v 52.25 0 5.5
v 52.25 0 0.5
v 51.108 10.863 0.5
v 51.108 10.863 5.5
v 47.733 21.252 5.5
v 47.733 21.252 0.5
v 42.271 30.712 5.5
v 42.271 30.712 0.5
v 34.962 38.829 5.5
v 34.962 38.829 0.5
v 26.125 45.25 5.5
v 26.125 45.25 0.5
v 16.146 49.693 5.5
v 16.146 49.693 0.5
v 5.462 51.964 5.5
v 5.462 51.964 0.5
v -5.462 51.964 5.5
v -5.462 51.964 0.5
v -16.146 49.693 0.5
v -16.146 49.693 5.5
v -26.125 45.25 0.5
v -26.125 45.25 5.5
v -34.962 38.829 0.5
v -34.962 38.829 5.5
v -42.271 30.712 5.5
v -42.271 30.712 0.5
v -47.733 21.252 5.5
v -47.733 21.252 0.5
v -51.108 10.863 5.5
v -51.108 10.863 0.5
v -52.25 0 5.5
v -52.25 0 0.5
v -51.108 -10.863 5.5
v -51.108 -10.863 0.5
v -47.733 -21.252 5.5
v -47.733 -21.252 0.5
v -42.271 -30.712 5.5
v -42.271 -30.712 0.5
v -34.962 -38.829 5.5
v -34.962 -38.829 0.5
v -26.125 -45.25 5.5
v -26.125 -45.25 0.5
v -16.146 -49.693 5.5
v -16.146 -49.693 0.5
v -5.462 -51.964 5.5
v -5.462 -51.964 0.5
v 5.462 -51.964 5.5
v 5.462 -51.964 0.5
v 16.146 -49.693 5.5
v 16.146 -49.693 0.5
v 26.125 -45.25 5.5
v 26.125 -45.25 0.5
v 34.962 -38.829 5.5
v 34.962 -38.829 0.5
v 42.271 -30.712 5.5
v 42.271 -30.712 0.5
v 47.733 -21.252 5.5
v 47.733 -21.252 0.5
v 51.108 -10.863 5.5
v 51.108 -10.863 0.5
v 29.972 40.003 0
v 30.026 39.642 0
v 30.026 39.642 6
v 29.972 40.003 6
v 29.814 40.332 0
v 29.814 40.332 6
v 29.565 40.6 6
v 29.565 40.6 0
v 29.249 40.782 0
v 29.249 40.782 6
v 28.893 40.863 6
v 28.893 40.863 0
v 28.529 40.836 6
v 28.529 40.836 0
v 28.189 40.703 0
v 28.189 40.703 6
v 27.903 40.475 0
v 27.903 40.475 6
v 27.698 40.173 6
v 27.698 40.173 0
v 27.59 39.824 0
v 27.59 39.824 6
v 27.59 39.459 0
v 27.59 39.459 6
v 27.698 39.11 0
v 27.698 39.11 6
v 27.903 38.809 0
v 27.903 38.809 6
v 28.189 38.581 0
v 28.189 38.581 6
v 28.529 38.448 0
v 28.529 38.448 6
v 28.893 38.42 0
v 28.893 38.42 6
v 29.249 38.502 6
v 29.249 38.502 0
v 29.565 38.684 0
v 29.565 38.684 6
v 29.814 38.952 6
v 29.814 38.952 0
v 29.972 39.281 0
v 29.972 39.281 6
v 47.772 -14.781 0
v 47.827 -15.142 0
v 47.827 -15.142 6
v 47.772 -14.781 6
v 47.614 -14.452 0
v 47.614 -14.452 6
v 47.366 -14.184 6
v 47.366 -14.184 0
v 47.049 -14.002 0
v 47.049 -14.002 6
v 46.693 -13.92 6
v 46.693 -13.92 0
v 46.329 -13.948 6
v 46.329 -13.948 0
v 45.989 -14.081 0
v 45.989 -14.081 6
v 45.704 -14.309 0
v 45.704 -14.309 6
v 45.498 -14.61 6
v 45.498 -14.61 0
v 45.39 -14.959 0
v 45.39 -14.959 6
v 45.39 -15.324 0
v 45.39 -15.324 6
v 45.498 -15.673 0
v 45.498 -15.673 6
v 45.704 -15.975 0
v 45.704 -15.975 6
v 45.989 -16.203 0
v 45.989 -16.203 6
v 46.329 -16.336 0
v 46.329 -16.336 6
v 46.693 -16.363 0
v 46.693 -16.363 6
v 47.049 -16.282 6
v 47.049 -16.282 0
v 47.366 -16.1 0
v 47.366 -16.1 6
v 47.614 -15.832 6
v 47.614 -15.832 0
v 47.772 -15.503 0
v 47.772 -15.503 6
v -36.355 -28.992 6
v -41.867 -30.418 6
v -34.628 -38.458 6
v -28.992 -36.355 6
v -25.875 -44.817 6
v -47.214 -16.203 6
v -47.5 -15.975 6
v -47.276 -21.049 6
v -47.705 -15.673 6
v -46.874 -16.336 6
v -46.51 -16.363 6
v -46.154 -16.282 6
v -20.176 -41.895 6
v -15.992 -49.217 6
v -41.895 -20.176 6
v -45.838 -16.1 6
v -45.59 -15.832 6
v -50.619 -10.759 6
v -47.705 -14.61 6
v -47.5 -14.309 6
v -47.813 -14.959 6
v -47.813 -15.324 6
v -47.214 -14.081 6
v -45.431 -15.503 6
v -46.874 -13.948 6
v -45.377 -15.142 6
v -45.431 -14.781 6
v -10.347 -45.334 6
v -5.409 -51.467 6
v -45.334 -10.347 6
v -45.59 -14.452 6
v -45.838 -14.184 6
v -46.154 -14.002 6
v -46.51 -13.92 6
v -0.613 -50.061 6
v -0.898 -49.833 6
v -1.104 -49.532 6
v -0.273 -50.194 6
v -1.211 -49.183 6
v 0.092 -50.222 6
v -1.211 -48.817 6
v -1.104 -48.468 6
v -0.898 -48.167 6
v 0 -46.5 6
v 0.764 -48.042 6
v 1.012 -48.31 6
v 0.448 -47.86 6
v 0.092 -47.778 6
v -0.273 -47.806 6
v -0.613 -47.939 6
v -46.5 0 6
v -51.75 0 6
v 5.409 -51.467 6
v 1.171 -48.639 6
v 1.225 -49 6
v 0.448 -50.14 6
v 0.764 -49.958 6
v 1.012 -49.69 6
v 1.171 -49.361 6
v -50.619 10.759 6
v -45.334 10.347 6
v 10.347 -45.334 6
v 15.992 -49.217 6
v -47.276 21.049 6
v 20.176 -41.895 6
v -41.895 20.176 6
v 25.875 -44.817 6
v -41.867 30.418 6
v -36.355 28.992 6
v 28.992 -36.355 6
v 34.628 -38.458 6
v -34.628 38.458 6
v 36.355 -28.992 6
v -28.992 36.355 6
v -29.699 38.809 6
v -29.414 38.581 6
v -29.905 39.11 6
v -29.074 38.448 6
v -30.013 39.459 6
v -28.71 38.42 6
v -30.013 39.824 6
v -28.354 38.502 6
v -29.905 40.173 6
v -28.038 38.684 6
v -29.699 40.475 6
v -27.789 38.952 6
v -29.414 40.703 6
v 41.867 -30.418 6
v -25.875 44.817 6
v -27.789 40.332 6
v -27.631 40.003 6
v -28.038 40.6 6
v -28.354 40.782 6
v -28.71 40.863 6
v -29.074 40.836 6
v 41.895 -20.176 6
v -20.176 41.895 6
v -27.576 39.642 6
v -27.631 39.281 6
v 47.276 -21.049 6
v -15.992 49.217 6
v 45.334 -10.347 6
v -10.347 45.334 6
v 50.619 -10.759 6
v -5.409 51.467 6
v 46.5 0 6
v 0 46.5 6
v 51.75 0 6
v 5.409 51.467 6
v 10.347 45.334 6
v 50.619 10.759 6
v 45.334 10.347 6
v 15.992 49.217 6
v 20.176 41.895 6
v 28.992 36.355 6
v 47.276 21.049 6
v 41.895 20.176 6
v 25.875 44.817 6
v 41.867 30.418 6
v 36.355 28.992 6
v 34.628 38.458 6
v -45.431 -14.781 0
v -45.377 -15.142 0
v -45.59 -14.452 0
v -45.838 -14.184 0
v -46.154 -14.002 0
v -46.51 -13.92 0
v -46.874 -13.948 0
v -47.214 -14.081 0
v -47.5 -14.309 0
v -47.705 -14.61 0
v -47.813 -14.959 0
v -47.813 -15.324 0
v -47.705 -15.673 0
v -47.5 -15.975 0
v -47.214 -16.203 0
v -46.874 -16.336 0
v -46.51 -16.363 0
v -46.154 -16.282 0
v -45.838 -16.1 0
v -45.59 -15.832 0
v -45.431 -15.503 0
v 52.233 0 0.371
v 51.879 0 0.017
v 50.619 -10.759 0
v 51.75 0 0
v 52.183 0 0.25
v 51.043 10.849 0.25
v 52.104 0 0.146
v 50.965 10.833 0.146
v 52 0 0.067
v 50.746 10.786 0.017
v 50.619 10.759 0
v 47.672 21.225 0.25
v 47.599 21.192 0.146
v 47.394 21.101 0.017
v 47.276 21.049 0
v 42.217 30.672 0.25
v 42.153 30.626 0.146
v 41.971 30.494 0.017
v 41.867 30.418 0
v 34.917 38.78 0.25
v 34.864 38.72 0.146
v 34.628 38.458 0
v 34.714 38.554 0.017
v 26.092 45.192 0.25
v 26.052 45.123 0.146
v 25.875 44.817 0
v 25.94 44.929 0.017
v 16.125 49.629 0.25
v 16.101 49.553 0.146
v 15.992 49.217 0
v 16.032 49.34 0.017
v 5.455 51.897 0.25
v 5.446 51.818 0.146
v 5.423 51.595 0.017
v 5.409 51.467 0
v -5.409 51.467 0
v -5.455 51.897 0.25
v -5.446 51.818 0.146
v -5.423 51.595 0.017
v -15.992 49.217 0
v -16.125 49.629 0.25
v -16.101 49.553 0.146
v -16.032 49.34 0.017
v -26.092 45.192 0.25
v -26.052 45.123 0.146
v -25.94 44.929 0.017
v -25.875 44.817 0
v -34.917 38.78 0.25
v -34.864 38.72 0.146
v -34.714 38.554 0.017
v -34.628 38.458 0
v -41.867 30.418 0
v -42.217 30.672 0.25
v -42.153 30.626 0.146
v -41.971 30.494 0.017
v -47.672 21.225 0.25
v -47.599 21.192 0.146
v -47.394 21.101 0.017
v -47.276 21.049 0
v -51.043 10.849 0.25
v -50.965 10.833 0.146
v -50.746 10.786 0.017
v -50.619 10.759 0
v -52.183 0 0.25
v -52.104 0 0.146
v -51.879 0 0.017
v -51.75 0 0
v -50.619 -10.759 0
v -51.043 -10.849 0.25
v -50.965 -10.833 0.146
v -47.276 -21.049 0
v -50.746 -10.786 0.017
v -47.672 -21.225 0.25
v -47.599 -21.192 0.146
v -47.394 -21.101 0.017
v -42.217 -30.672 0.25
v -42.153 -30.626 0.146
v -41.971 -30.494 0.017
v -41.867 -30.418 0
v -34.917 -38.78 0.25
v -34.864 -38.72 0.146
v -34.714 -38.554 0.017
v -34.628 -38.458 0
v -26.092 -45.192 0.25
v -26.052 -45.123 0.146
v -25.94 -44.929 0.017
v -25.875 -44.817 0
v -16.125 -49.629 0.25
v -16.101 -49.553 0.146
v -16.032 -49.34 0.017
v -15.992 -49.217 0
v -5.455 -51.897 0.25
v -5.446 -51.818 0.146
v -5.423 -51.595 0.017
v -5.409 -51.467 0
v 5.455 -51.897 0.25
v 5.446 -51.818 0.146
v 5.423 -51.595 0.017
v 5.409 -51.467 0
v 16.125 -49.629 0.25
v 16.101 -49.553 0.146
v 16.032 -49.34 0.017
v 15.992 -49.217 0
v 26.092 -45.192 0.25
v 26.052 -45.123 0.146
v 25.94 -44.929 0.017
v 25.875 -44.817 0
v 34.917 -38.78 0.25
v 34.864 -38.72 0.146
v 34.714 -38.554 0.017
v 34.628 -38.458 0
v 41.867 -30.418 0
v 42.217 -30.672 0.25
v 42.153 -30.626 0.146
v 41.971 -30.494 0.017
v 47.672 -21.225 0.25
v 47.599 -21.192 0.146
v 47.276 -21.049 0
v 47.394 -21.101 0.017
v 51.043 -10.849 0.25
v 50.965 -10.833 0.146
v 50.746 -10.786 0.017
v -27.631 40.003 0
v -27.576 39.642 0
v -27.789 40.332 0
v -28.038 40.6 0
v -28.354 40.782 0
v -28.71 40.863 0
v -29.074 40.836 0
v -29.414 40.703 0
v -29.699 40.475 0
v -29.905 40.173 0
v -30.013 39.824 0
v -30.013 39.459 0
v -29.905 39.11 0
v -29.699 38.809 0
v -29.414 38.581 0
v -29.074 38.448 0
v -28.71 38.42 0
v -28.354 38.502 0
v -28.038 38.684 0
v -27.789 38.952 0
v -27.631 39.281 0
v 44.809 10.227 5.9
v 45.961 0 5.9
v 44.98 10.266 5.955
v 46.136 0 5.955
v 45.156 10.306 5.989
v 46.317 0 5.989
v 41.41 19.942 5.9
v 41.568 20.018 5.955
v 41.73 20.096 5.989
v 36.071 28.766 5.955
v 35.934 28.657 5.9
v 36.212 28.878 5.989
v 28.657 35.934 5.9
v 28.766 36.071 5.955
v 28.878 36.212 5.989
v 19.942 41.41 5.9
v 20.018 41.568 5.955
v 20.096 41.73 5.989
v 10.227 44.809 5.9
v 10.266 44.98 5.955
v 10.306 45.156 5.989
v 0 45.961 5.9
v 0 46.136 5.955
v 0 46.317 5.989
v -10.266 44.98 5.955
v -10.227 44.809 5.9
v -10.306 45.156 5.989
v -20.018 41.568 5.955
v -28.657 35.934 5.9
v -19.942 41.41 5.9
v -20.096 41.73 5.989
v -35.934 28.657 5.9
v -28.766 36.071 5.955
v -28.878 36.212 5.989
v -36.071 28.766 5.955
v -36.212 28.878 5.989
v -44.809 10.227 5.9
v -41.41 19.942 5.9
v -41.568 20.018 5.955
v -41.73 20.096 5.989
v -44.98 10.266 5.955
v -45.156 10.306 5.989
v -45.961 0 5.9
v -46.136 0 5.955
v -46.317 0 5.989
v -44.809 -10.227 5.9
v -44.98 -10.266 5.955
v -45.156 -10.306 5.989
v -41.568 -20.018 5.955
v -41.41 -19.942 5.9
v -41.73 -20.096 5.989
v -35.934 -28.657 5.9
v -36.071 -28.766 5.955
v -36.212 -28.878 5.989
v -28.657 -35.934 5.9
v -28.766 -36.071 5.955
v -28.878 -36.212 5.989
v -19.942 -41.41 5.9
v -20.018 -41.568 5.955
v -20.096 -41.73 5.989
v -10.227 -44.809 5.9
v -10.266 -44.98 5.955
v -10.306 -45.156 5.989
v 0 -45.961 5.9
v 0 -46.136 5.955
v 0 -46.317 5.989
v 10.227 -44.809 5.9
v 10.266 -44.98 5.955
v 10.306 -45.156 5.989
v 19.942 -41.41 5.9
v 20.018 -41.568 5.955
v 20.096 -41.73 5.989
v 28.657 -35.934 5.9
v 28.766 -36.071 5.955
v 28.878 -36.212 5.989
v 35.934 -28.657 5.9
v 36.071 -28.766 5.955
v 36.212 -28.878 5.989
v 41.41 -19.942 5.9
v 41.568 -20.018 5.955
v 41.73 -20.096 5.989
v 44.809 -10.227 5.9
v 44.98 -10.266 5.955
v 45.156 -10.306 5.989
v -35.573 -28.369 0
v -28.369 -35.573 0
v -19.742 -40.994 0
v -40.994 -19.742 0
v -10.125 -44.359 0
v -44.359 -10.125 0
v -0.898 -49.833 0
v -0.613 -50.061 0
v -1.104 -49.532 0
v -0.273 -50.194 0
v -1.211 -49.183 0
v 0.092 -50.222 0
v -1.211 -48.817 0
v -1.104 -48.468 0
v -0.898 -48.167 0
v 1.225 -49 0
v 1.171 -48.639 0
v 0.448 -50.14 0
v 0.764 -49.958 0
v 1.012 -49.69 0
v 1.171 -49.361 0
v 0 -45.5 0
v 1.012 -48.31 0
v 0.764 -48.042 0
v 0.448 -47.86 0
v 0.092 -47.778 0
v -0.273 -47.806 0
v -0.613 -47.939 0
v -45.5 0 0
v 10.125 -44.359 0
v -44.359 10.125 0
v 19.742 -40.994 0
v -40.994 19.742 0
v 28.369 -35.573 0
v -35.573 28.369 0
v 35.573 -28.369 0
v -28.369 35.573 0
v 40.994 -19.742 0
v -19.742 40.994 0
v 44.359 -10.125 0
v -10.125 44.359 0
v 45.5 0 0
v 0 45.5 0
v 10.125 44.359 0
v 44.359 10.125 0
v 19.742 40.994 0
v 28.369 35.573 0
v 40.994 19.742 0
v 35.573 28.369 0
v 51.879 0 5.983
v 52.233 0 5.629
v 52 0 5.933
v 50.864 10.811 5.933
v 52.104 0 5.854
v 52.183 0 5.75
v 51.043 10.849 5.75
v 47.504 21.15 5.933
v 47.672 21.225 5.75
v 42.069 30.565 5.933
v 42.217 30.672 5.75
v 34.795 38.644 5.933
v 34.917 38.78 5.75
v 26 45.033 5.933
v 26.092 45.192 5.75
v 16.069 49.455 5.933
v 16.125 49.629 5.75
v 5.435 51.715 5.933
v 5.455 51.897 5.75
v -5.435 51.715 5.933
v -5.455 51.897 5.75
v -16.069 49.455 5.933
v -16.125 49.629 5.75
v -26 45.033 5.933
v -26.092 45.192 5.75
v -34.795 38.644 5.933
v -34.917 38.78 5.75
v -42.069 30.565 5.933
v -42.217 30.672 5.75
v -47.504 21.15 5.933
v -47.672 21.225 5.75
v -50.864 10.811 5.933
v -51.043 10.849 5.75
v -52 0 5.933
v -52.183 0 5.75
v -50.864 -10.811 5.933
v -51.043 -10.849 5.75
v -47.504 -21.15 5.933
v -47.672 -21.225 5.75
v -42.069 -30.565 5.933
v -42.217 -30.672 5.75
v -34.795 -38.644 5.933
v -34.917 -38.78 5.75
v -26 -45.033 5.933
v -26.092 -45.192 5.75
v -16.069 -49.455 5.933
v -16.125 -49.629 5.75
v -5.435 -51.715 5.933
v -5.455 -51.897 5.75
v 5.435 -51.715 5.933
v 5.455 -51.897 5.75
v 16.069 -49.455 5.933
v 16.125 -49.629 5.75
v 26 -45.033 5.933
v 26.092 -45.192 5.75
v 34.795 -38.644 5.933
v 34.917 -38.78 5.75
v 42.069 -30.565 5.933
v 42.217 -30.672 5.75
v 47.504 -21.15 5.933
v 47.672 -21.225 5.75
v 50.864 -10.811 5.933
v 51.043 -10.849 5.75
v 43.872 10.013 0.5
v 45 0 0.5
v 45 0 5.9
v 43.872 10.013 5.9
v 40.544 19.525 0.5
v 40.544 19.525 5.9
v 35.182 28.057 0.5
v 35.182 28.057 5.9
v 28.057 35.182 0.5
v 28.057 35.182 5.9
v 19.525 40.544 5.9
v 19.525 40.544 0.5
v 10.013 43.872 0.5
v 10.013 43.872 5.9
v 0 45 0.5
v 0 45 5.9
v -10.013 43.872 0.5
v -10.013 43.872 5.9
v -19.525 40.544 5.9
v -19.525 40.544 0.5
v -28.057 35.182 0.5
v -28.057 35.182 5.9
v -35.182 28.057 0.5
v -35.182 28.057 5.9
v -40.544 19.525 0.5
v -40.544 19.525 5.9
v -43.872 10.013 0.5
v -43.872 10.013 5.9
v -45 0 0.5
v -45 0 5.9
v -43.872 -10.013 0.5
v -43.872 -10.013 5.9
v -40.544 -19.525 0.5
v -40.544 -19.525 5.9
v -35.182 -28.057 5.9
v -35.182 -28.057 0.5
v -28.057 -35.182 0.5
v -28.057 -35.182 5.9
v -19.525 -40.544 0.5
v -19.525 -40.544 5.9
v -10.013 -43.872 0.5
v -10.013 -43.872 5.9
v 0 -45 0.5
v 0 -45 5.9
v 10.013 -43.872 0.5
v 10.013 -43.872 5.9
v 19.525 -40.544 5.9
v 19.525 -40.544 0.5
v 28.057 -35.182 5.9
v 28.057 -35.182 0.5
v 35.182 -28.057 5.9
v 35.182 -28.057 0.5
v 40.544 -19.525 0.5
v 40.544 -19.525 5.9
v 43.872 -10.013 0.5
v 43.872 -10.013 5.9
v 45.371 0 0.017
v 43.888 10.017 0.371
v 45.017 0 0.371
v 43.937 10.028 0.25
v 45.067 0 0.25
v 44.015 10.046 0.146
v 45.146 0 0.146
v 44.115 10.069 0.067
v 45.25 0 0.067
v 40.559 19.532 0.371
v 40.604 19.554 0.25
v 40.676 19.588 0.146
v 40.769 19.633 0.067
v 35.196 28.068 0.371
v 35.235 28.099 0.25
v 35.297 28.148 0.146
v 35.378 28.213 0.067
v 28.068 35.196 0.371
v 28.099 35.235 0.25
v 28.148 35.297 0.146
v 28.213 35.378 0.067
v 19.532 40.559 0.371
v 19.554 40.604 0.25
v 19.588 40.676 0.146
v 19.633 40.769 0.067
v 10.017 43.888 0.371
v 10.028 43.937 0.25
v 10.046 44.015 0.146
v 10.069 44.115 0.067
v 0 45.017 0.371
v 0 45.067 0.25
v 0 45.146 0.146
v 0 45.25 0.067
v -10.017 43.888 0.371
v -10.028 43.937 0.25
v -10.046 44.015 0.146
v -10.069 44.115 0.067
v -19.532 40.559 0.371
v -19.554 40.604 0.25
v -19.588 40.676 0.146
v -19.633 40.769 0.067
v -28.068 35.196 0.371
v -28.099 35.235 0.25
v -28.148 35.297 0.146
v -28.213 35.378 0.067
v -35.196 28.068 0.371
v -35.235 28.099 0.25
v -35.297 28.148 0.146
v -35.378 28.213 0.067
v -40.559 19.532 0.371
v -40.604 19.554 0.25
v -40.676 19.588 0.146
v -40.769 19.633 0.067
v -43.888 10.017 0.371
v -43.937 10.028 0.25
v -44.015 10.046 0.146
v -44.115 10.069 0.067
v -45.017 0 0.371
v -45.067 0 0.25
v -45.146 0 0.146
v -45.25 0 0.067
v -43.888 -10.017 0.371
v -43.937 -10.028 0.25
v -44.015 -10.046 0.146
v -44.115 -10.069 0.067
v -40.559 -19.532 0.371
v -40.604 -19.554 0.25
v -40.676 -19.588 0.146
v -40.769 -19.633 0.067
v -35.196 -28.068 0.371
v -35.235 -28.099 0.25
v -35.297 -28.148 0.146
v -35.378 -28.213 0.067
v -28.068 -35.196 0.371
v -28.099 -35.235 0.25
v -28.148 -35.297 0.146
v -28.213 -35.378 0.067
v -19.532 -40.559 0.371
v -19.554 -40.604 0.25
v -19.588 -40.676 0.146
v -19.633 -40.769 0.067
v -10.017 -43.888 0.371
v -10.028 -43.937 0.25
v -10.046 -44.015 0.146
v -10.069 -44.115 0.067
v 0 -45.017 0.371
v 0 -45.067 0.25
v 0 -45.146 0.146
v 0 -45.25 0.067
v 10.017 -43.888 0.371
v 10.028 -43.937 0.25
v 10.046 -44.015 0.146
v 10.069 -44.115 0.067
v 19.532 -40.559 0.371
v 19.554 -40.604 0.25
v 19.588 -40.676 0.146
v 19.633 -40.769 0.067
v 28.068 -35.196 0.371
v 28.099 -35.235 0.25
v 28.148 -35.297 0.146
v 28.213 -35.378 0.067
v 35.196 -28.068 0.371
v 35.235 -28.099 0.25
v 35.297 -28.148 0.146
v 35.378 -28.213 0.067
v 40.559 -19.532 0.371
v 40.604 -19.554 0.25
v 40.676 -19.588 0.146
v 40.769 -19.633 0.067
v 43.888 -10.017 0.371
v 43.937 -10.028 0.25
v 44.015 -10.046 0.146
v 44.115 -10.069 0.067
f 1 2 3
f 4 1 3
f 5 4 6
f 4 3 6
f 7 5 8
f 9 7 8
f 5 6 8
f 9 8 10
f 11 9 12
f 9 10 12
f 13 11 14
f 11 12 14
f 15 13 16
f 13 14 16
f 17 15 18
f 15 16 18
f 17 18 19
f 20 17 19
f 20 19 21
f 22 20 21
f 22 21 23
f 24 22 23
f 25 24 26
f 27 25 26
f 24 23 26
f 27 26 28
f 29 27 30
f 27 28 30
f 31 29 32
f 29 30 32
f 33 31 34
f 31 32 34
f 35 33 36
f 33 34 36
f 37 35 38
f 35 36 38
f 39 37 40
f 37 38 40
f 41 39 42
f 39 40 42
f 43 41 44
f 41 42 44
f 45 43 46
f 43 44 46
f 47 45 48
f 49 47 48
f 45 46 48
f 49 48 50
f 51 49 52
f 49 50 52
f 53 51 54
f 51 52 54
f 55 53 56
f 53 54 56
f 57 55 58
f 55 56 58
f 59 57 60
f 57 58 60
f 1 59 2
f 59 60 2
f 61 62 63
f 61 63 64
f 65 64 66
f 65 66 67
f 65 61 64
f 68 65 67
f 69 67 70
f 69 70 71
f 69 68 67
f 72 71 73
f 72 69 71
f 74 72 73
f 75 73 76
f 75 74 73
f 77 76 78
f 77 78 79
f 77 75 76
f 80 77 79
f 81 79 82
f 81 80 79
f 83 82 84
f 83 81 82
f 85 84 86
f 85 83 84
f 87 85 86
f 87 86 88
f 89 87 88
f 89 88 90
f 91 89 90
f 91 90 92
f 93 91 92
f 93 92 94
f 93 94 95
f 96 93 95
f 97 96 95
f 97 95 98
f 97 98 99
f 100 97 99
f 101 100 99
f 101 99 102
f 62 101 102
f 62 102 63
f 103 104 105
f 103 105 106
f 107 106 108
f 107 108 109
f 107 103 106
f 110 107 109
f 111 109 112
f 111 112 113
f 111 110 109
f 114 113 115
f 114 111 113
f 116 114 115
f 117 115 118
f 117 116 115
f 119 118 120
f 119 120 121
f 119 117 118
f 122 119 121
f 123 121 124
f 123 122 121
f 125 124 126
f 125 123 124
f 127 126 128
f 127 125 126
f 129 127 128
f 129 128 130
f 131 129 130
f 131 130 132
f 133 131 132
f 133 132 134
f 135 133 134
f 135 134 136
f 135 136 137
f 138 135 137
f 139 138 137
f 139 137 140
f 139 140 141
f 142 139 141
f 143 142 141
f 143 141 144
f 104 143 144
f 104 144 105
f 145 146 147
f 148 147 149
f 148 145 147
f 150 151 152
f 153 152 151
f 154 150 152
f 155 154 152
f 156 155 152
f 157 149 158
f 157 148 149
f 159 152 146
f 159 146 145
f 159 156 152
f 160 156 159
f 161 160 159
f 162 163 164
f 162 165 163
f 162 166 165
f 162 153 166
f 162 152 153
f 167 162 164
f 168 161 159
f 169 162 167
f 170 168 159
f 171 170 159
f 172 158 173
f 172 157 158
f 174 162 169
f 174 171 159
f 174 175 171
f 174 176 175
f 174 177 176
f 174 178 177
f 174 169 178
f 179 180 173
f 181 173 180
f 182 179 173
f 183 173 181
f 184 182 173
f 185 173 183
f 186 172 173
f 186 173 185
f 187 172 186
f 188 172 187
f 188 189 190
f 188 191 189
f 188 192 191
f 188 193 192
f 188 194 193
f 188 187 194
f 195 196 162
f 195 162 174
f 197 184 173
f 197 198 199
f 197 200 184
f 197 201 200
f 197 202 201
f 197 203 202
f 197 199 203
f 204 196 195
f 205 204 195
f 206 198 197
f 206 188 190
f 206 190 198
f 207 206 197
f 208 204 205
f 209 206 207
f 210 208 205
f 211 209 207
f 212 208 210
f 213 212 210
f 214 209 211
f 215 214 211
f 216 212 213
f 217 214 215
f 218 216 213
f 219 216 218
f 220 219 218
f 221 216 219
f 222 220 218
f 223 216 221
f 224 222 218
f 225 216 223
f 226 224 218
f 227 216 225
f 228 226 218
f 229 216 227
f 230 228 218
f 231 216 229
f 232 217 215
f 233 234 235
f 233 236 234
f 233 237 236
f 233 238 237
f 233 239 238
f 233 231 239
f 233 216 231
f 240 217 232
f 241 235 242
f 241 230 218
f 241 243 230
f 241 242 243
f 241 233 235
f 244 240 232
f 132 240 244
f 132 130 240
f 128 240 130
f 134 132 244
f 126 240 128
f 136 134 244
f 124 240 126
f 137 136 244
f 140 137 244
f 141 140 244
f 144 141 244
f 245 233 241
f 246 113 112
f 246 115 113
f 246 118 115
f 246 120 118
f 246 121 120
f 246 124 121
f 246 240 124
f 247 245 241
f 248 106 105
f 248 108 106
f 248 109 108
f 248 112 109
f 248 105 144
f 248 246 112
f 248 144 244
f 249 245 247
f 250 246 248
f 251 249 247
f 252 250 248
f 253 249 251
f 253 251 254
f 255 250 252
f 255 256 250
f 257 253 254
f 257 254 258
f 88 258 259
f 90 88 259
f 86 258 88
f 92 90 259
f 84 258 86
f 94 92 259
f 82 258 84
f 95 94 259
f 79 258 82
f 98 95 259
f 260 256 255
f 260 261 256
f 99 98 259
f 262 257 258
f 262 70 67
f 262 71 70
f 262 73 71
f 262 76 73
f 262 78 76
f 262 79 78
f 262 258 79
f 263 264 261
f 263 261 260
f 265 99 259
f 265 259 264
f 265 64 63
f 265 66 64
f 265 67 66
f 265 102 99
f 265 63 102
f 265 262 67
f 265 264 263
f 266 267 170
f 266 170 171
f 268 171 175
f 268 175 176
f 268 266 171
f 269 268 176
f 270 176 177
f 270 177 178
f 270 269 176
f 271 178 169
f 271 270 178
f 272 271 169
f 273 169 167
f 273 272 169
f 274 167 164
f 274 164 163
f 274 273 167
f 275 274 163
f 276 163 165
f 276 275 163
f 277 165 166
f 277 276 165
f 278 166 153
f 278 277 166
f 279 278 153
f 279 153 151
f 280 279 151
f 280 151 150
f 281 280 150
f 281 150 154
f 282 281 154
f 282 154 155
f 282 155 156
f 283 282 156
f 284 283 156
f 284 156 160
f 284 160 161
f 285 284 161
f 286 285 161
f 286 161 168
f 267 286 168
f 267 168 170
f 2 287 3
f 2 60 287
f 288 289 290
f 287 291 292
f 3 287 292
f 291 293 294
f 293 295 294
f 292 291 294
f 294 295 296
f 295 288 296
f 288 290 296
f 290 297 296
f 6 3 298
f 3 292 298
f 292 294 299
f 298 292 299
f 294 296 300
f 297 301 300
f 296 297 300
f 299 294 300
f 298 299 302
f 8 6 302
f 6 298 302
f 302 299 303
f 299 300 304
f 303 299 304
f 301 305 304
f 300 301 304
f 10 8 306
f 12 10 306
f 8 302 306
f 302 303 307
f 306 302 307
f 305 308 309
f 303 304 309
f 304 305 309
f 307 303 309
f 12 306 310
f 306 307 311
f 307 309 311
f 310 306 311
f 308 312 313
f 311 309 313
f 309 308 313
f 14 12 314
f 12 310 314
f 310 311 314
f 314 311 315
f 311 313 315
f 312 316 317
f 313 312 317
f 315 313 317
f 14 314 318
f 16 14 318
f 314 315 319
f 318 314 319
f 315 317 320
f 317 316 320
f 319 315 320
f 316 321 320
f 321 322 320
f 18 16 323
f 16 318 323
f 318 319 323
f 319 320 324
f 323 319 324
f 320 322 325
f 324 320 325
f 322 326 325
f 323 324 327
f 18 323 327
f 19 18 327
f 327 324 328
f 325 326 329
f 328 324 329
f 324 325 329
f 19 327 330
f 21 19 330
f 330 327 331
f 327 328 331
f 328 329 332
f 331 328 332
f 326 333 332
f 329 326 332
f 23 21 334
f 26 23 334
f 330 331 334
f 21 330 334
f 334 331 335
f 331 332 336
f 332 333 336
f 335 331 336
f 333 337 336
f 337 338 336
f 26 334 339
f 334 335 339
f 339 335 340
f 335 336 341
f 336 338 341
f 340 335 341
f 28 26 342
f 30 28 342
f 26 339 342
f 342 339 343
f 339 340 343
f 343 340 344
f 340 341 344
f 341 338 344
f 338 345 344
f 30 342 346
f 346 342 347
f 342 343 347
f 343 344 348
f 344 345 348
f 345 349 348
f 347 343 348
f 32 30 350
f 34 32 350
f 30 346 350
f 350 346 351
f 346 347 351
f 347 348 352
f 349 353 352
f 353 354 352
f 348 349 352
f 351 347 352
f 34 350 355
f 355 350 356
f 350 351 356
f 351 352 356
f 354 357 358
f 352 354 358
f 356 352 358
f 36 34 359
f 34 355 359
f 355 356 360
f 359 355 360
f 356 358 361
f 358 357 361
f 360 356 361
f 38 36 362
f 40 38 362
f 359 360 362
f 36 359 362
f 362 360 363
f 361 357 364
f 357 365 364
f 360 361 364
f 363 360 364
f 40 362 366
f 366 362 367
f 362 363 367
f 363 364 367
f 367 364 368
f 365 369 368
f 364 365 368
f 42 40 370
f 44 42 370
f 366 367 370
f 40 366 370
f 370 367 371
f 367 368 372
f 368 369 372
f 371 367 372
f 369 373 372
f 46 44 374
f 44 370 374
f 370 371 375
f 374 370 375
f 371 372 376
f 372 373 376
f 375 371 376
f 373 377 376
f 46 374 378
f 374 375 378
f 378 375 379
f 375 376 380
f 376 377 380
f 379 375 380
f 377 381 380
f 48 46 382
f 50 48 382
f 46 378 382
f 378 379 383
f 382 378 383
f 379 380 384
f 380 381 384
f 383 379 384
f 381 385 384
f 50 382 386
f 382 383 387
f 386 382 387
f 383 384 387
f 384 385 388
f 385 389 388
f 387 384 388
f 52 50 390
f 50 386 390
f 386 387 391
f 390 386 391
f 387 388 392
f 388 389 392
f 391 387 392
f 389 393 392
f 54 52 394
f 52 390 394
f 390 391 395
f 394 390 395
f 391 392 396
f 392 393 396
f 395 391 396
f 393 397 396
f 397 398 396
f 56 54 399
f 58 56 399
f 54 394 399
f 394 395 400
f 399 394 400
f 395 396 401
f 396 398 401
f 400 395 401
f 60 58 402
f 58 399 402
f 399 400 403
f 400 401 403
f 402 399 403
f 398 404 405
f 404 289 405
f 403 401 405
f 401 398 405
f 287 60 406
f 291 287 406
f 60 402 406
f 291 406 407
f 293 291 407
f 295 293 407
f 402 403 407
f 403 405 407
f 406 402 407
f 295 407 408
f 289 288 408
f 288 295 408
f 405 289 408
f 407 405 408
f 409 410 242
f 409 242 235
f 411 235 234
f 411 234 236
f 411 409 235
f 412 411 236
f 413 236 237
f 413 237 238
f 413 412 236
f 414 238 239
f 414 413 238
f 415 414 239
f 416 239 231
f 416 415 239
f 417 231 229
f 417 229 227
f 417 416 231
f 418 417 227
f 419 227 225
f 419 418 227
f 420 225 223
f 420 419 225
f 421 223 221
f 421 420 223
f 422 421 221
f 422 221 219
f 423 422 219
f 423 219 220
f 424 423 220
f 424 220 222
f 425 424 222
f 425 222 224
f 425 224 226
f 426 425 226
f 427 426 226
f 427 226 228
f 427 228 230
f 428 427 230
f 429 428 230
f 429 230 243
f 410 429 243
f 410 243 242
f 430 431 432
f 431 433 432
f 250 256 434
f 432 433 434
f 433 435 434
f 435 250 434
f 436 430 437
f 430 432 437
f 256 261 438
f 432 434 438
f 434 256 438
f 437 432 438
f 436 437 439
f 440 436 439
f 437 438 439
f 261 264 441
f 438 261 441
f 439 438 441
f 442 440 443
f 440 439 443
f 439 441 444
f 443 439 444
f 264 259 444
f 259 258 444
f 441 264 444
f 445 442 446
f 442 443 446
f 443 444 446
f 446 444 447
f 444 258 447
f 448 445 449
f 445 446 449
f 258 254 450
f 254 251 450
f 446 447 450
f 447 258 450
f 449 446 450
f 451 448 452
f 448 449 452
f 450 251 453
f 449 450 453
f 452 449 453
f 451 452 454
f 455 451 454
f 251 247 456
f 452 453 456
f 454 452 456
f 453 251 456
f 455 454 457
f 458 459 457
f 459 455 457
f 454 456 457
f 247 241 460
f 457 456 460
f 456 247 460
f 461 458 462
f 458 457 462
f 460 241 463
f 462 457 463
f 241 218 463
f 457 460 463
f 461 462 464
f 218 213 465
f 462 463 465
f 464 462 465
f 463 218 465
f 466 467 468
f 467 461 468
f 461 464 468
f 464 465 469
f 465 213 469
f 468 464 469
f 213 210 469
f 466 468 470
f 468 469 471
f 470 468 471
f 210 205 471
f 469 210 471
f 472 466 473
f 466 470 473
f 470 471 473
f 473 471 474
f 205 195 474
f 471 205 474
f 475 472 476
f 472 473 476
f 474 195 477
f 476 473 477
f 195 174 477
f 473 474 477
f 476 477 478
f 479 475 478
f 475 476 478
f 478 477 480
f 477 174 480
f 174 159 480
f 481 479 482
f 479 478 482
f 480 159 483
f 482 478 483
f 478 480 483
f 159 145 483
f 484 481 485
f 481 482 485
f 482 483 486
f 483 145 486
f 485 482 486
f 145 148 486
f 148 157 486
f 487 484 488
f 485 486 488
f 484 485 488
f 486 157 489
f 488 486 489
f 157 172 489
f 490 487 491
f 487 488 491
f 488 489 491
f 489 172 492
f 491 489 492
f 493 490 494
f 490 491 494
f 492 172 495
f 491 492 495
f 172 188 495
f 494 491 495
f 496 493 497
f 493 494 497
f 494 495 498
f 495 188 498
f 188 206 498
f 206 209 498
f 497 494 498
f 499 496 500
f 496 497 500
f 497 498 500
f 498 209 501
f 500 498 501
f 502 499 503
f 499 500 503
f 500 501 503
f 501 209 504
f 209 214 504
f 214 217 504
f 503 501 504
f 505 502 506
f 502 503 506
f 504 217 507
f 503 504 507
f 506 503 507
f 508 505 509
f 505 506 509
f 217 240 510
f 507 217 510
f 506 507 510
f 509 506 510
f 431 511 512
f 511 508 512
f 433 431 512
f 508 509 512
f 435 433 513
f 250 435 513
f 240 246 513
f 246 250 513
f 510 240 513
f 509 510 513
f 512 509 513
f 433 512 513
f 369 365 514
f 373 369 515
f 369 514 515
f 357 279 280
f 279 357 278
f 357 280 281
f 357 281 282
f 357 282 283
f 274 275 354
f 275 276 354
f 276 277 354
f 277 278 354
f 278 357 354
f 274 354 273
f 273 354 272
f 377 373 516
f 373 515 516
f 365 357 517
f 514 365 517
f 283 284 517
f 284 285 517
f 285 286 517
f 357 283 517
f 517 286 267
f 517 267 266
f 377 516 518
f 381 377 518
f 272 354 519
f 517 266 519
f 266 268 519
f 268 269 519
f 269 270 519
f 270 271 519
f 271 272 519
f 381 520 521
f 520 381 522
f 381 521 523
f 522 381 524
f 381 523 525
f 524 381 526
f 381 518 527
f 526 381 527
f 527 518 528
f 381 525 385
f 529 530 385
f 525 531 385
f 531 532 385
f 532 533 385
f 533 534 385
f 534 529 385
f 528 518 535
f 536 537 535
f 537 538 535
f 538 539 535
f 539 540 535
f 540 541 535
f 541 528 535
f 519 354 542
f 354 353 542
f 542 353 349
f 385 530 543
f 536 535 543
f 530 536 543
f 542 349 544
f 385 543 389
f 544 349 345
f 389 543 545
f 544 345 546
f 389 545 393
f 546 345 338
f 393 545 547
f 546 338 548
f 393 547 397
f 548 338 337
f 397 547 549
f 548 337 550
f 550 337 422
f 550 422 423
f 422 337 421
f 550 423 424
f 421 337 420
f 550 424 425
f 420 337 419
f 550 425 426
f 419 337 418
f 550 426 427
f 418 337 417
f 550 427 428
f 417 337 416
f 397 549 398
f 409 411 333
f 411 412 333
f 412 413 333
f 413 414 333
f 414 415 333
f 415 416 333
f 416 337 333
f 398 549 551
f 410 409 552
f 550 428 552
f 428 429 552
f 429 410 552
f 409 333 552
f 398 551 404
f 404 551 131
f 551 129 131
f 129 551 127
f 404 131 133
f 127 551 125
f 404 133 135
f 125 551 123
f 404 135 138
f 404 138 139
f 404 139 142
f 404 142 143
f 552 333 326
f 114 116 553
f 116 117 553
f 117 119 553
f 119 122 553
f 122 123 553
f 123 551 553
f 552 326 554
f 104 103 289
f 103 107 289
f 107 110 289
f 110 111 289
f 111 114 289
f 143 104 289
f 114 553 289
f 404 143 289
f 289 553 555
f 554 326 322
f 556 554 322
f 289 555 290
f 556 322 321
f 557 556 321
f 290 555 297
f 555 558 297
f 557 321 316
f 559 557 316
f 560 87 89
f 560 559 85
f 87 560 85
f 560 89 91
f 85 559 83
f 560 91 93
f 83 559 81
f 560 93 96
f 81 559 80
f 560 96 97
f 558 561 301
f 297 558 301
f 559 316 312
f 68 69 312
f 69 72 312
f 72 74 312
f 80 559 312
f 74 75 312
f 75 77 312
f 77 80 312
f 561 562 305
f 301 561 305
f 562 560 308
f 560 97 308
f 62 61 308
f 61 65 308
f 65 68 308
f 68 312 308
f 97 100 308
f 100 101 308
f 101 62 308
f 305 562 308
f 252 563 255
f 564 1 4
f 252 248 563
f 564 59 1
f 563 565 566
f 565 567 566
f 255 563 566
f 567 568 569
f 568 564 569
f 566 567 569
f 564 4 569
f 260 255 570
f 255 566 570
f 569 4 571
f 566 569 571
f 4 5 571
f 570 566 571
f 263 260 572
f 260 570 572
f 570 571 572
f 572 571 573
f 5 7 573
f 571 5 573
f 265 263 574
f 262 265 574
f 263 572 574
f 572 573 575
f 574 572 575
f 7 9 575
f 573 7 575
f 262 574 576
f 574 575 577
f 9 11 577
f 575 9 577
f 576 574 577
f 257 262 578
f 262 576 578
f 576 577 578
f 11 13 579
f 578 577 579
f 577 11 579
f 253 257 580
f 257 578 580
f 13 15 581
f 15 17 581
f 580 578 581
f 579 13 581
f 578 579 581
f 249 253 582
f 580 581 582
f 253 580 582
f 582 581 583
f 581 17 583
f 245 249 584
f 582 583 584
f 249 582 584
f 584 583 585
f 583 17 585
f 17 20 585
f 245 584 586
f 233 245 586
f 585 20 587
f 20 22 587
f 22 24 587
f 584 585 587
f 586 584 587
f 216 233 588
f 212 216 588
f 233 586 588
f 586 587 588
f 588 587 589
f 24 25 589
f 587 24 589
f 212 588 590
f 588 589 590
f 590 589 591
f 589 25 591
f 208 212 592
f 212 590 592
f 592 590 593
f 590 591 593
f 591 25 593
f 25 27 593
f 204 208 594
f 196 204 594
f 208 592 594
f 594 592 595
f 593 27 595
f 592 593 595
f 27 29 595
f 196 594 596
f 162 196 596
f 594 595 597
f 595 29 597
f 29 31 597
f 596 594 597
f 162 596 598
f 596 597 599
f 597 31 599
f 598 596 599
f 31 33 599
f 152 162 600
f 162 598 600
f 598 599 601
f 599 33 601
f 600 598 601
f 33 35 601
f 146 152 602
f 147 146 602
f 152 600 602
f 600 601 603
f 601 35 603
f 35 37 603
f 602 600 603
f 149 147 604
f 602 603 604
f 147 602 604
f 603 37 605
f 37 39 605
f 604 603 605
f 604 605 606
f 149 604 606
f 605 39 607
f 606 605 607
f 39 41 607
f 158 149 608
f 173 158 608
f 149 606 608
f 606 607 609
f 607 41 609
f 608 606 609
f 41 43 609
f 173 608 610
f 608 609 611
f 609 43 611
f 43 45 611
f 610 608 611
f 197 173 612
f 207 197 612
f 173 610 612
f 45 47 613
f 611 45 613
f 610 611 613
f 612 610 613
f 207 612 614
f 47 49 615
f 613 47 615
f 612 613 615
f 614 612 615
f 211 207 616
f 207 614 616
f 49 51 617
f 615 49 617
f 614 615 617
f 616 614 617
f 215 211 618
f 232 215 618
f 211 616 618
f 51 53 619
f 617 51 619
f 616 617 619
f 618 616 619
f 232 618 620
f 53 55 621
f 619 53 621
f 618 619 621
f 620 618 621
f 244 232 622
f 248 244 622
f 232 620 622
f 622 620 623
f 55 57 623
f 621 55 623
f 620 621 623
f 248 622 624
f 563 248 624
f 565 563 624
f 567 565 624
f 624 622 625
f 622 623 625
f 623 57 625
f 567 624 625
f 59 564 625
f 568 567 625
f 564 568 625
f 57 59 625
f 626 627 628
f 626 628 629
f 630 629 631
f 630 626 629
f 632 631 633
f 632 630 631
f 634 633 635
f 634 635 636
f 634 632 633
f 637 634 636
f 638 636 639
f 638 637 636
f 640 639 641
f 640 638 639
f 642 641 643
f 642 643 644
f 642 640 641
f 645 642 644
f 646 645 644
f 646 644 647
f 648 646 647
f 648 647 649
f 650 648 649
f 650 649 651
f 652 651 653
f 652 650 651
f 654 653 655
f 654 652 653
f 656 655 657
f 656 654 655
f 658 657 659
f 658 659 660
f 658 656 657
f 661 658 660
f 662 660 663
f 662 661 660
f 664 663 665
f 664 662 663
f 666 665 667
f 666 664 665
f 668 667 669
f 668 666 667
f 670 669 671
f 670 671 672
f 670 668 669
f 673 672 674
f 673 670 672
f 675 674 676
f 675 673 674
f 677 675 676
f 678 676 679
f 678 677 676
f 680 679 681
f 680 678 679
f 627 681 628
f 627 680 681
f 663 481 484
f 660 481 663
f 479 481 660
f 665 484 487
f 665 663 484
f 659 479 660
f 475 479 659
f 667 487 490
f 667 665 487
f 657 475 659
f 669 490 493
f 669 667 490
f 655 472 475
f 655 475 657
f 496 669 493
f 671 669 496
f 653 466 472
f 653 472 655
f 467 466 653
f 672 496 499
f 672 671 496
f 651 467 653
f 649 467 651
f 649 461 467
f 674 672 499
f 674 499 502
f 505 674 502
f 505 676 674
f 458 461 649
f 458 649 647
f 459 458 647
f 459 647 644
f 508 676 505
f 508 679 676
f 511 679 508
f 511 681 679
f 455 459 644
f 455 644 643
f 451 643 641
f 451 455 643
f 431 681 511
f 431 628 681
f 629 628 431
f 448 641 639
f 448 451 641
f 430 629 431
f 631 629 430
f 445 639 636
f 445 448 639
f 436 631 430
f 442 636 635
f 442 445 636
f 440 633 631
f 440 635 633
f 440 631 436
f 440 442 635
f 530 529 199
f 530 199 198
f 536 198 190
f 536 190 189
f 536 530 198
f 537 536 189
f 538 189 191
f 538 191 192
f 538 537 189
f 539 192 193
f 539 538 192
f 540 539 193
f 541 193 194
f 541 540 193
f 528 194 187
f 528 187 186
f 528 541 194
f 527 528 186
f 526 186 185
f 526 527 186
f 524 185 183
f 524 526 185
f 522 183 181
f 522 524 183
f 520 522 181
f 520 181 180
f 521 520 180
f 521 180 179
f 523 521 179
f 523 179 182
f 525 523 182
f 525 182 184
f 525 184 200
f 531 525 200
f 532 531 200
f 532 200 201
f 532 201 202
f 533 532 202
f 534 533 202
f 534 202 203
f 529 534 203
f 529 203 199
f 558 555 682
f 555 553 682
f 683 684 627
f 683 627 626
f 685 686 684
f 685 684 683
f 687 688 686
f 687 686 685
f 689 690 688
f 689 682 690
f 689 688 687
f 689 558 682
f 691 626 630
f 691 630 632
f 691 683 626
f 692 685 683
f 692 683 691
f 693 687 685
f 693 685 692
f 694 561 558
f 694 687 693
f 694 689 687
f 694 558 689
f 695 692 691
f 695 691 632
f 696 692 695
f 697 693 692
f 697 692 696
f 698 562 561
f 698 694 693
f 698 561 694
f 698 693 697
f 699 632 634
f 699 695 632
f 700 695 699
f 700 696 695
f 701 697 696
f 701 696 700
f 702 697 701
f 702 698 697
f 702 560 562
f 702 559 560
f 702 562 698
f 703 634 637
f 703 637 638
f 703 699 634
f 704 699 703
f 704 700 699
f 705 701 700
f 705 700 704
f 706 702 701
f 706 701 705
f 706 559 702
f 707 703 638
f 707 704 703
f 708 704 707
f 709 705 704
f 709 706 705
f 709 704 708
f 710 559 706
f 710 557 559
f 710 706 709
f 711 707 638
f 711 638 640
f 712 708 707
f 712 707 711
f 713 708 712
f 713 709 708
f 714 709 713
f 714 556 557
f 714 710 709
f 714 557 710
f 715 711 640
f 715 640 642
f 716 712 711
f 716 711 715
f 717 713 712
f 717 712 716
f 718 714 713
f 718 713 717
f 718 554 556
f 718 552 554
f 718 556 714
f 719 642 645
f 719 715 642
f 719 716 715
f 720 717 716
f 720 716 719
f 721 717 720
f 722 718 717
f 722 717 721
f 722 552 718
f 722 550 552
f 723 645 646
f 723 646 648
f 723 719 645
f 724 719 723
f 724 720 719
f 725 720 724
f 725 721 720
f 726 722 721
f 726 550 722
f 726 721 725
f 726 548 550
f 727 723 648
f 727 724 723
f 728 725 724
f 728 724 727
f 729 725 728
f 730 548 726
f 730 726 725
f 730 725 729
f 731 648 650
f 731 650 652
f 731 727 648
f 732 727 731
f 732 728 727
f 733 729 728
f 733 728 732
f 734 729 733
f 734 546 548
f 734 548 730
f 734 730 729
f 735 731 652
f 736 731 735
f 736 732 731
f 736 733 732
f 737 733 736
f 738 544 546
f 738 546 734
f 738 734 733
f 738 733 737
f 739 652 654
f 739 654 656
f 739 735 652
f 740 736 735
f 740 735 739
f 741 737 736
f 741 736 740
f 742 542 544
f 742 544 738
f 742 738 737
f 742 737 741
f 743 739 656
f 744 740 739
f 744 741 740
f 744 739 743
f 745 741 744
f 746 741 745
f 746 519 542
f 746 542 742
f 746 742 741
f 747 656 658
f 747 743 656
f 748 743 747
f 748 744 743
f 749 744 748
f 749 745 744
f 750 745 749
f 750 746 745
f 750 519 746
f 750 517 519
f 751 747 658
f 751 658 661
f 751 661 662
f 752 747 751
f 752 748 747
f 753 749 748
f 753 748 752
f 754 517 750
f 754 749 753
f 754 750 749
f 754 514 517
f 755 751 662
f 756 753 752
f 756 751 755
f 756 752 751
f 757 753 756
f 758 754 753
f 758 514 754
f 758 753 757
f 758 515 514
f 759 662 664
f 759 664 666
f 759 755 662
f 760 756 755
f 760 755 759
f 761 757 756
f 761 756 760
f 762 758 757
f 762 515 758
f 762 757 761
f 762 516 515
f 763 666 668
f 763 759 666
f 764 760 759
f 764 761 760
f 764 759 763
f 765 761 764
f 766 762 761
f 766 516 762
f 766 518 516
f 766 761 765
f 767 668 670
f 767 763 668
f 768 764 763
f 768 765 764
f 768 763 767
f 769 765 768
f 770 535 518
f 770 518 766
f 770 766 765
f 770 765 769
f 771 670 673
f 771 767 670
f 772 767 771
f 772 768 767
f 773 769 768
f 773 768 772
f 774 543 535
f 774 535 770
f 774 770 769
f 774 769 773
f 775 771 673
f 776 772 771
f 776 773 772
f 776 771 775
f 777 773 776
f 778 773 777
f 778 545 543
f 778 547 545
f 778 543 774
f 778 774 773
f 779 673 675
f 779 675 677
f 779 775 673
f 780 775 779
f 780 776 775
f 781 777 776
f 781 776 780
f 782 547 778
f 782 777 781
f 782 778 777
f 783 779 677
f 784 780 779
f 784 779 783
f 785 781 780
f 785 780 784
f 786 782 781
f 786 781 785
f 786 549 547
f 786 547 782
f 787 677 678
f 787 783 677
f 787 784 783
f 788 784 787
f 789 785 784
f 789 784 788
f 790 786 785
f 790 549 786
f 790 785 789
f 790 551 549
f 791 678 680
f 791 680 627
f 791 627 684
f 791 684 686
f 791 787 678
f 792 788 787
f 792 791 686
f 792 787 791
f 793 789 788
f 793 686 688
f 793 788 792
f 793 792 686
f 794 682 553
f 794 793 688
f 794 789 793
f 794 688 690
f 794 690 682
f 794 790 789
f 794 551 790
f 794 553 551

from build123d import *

# Parameters (mm, degrees)
F0_R     = 52.25
F0_R_2   = 1.225
F0_R_3   = 45
F1_DEPTH = 6
F2_R     = 1.5
F3_DEPTH = 5.9
F4_R     = 0.5


with BuildPart() as f1:
    # F0 (on Top) → F1 (new body)
    with BuildSketch(Plane.XY):
        Circle(F0_R)
        with Locations((-46.601769, -15.141833)):
            Circle(F0_R_2, mode=Mode.SUBTRACT)
        with Locations((0, -49)):
            Circle(F0_R_2, mode=Mode.SUBTRACT)
        with Locations((46.601769, -15.141833)):
            Circle(F0_R_2, mode=Mode.SUBTRACT)
        with Locations((-28.801477, 39.641833)):
            Circle(F0_R_2, mode=Mode.SUBTRACT)
        Circle(F0_R_3, mode=Mode.SUBTRACT)
        with Locations((28.801477, 39.641833)):
            Circle(F0_R_2, mode=Mode.SUBTRACT)
    extrude(amount=F1_DEPTH)

    # F2
    f2_edges = [f1.edges().sort_by_distance(p)[0] for p in [
        (-45, 0, 6),
    ]]
    fillet(f2_edges, radius=F2_R)

    # F0 (on Top) → F3 (join)
    with BuildSketch(Plane.XY):
        Circle(F0_R)
        with Locations((-46.601769, -15.141833)):
            Circle(F0_R_2, mode=Mode.SUBTRACT)
        with Locations((0, -49)):
            Circle(F0_R_2, mode=Mode.SUBTRACT)
        with Locations((46.601769, -15.141833)):
            Circle(F0_R_2, mode=Mode.SUBTRACT)
        with Locations((-28.801477, 39.641833)):
            Circle(F0_R_2, mode=Mode.SUBTRACT)
        Circle(F0_R_3, mode=Mode.SUBTRACT)
        with Locations((28.801477, 39.641833)):
            Circle(F0_R_2, mode=Mode.SUBTRACT)
    extrude(amount=F3_DEPTH)

    # F4
    f4_edges = [f1.edges().sort_by_distance(p)[0] for p in [
        (-45, 0, 0),
        (-52.25, 0, 0),
        (-52.25, 0, 6),
    ]]
    fillet(f4_edges, radius=F4_R)


solid = f1.part
